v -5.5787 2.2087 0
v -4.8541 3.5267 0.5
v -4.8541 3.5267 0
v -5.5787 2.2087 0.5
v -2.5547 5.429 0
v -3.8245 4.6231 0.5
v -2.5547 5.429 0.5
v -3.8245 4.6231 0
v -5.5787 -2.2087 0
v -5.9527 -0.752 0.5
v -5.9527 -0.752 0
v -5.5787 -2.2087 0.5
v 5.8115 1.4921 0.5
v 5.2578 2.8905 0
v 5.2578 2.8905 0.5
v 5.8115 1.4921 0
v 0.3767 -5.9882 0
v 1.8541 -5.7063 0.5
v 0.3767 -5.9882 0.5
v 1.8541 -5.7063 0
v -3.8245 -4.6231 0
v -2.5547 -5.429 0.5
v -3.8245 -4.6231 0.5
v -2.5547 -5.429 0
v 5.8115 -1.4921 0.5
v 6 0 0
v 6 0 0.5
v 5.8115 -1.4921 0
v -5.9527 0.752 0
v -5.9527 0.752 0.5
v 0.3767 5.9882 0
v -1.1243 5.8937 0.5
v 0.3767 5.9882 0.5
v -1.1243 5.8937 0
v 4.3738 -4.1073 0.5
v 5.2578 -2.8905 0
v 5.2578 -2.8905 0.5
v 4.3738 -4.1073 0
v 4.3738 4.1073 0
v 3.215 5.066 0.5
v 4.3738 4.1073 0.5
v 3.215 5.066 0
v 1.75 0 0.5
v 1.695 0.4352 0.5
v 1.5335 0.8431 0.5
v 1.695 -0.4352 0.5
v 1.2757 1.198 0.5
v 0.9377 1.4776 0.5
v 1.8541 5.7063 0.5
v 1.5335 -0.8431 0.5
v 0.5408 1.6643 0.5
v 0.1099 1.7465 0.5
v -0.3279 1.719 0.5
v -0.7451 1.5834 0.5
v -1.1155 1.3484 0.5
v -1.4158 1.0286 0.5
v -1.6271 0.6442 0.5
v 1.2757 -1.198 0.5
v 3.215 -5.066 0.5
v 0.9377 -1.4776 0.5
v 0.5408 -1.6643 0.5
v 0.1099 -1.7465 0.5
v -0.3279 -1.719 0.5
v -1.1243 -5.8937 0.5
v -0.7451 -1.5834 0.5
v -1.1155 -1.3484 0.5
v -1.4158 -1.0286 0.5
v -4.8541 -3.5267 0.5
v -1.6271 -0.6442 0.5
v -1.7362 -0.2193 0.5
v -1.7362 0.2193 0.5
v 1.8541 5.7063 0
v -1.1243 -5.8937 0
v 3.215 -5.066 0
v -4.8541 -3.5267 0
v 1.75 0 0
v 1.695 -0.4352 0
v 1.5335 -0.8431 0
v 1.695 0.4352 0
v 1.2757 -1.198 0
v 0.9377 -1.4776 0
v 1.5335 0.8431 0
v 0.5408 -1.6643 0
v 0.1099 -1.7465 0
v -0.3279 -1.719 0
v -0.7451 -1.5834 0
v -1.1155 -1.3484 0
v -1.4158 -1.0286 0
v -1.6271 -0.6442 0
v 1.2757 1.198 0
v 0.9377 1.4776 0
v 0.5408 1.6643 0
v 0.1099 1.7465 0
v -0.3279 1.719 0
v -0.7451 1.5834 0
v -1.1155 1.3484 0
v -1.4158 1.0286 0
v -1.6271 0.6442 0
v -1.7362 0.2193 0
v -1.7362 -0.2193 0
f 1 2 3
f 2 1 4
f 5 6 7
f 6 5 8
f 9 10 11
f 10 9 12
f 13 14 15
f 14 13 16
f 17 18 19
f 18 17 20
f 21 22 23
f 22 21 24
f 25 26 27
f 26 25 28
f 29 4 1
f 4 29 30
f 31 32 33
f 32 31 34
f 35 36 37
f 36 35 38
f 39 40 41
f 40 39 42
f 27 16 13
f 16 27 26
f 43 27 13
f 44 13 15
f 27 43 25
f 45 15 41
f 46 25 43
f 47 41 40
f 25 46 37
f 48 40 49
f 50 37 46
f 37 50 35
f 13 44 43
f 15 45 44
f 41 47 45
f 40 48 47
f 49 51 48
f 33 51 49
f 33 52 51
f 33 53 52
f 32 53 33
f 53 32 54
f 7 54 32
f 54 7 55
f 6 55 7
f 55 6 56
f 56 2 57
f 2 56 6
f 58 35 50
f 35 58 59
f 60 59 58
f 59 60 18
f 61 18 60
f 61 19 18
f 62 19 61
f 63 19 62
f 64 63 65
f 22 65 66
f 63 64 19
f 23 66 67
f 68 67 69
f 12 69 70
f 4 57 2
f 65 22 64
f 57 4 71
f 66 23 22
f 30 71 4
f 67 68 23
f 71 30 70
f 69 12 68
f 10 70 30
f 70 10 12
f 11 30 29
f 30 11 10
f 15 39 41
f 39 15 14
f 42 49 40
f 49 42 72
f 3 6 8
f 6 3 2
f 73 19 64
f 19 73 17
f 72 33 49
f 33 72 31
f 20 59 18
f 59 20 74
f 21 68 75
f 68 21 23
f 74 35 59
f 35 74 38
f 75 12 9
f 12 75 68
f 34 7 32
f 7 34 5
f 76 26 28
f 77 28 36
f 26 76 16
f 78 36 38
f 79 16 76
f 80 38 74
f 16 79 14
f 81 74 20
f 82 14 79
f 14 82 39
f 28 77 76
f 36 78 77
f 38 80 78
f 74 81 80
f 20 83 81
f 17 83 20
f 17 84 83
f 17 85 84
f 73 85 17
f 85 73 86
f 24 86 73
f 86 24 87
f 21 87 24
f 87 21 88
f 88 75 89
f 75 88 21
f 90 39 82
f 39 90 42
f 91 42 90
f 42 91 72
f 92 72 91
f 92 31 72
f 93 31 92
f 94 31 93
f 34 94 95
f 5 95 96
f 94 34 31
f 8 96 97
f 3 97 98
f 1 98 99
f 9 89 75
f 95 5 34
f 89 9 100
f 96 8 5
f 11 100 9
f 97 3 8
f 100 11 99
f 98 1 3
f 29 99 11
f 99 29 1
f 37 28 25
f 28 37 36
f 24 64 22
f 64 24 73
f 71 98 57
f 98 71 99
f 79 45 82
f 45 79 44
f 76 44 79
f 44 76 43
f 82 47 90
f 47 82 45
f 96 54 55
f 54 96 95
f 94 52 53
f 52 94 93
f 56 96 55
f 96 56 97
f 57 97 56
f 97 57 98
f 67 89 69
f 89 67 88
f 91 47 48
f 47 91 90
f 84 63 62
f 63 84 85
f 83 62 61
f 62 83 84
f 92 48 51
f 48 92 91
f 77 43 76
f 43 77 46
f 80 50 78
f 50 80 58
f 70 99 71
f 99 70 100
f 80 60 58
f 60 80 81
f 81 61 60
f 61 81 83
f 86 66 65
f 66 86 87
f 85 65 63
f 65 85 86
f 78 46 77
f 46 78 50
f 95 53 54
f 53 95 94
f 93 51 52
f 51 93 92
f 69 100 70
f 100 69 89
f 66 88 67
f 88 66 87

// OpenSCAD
difference(){
    $fn=25;
    cylinder(d=12, h=0.5);
    cylinder(d=3.5,h=0.5);
}
